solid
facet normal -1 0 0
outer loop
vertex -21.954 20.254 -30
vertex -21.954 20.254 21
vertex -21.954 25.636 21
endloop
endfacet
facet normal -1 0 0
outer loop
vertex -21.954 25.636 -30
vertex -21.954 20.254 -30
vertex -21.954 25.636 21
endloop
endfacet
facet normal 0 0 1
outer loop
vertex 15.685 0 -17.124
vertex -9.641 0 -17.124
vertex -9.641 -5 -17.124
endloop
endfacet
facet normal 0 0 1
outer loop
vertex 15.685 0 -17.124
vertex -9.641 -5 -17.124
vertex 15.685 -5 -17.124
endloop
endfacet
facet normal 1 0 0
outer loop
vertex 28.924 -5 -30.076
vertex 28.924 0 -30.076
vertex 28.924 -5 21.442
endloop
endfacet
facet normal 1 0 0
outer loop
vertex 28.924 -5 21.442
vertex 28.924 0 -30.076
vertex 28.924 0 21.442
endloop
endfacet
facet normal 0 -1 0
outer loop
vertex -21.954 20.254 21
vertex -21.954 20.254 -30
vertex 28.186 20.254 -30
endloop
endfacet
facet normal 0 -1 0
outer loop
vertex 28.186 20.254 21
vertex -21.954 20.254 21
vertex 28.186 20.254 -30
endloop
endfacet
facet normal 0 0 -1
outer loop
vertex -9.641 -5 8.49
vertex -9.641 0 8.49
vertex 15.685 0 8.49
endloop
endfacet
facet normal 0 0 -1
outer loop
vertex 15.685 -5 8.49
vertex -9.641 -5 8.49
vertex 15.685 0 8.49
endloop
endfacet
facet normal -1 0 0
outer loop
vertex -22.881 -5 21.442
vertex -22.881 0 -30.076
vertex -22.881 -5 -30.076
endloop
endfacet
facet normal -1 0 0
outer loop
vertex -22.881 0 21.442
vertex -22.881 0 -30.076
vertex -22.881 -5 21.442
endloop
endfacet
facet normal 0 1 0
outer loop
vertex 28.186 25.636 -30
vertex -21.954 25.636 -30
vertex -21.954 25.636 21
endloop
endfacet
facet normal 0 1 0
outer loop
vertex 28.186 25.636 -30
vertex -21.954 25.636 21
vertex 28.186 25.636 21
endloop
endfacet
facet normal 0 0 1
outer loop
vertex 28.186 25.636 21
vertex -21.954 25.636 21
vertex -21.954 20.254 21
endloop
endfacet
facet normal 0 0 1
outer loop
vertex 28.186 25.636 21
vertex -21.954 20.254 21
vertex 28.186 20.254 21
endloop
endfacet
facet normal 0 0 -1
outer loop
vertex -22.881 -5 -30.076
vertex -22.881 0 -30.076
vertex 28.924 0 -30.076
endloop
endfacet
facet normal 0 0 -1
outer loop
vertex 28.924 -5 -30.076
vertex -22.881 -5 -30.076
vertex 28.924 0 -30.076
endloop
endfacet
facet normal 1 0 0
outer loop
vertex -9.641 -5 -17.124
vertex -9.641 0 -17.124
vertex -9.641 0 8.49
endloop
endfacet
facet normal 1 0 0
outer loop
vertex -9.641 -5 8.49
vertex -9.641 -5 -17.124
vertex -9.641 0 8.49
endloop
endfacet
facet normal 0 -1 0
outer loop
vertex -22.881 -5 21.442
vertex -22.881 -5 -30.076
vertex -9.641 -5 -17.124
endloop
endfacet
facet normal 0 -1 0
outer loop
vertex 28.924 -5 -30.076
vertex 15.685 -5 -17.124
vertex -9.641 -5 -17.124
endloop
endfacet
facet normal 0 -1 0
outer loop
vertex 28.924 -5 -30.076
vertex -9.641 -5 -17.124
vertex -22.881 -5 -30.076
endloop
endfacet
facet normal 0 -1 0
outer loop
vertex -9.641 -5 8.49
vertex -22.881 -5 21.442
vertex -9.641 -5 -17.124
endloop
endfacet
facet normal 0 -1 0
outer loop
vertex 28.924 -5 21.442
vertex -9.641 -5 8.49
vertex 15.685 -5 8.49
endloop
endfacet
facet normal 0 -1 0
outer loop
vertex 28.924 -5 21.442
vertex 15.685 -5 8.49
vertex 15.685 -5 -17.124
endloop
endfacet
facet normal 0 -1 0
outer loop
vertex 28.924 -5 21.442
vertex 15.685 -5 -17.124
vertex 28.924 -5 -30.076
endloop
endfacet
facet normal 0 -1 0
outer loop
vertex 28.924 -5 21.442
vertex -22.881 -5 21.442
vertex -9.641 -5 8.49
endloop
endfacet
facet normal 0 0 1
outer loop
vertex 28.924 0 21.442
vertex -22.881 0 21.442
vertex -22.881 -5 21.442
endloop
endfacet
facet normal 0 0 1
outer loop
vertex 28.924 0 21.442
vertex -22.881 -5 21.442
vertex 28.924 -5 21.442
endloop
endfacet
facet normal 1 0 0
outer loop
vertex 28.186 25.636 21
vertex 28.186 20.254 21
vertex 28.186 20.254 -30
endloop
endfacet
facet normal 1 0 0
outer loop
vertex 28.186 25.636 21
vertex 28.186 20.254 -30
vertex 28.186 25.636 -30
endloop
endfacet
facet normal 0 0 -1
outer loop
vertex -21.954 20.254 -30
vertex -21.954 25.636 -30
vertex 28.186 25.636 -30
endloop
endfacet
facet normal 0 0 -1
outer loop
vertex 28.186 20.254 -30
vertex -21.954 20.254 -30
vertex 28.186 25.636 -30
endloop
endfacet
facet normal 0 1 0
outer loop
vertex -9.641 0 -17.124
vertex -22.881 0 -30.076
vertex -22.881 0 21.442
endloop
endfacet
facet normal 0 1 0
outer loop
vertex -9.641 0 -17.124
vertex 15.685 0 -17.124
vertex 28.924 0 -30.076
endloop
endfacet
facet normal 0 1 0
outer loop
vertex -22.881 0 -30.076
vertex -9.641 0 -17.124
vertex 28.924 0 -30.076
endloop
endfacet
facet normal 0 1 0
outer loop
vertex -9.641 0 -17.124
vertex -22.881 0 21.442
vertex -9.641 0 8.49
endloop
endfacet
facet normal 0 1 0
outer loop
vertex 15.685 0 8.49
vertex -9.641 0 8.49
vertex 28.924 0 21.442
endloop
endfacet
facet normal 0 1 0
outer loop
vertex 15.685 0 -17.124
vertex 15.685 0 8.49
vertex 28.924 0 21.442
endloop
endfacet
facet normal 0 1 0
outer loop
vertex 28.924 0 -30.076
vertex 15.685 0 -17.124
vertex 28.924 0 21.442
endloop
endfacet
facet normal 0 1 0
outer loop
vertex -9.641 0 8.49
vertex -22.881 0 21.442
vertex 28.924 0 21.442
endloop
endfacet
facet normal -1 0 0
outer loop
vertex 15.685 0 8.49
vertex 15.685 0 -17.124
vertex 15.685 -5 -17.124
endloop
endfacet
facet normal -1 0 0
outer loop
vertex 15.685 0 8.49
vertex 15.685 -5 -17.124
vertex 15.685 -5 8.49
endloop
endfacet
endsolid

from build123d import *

# Parameters (mm, degrees)
F0_W     = 51.8050342798
F0_H     = 51.5172313899
F0_W_2   = 25.3269076347
F0_H_2   = 25.6147123873
F1_DEPTH = 5
F3_W     = 50.1393936574
F3_H     = 5.3821932524
F4_DEPTH = 21
F5_DEPTH = 30


# Not quite as in the source:
# - the program builds the solid bodies; features that only make, move or delete a surface that nothing else refers to are left out


with BuildPart() as f1:
    # F0 (on Front) → F1 (new body)
    with BuildSketch(Plane.XZ):
        with Locations((3.0219592154, -4.3170871213)):
            Rectangle(F0_W, F0_H)
        with Locations((3.021961078, -4.31708619)):
            Rectangle(F0_W_2, F0_H_2, mode=Mode.SUBTRACT)
    extrude(amount=F1_DEPTH)


with BuildPart() as f4:
    # F3 (on Top) → F4 (new body)
    with BuildSketch(Plane.XY):
        with Locations((3.1160078943, 22.9451442137)):
            Rectangle(F3_W, F3_H)
    extrude(amount=F4_DEPTH)

    # F5 (add): a face of the model
    f5_faces = [f4.faces().sort_by_distance(p)[0] for p in [
        (3.1160078943, 22.9451442137, 0),
    ]]
    extrude(f5_faces, amount=F5_DEPTH)


solid = Compound([f1.part, f4.part])
